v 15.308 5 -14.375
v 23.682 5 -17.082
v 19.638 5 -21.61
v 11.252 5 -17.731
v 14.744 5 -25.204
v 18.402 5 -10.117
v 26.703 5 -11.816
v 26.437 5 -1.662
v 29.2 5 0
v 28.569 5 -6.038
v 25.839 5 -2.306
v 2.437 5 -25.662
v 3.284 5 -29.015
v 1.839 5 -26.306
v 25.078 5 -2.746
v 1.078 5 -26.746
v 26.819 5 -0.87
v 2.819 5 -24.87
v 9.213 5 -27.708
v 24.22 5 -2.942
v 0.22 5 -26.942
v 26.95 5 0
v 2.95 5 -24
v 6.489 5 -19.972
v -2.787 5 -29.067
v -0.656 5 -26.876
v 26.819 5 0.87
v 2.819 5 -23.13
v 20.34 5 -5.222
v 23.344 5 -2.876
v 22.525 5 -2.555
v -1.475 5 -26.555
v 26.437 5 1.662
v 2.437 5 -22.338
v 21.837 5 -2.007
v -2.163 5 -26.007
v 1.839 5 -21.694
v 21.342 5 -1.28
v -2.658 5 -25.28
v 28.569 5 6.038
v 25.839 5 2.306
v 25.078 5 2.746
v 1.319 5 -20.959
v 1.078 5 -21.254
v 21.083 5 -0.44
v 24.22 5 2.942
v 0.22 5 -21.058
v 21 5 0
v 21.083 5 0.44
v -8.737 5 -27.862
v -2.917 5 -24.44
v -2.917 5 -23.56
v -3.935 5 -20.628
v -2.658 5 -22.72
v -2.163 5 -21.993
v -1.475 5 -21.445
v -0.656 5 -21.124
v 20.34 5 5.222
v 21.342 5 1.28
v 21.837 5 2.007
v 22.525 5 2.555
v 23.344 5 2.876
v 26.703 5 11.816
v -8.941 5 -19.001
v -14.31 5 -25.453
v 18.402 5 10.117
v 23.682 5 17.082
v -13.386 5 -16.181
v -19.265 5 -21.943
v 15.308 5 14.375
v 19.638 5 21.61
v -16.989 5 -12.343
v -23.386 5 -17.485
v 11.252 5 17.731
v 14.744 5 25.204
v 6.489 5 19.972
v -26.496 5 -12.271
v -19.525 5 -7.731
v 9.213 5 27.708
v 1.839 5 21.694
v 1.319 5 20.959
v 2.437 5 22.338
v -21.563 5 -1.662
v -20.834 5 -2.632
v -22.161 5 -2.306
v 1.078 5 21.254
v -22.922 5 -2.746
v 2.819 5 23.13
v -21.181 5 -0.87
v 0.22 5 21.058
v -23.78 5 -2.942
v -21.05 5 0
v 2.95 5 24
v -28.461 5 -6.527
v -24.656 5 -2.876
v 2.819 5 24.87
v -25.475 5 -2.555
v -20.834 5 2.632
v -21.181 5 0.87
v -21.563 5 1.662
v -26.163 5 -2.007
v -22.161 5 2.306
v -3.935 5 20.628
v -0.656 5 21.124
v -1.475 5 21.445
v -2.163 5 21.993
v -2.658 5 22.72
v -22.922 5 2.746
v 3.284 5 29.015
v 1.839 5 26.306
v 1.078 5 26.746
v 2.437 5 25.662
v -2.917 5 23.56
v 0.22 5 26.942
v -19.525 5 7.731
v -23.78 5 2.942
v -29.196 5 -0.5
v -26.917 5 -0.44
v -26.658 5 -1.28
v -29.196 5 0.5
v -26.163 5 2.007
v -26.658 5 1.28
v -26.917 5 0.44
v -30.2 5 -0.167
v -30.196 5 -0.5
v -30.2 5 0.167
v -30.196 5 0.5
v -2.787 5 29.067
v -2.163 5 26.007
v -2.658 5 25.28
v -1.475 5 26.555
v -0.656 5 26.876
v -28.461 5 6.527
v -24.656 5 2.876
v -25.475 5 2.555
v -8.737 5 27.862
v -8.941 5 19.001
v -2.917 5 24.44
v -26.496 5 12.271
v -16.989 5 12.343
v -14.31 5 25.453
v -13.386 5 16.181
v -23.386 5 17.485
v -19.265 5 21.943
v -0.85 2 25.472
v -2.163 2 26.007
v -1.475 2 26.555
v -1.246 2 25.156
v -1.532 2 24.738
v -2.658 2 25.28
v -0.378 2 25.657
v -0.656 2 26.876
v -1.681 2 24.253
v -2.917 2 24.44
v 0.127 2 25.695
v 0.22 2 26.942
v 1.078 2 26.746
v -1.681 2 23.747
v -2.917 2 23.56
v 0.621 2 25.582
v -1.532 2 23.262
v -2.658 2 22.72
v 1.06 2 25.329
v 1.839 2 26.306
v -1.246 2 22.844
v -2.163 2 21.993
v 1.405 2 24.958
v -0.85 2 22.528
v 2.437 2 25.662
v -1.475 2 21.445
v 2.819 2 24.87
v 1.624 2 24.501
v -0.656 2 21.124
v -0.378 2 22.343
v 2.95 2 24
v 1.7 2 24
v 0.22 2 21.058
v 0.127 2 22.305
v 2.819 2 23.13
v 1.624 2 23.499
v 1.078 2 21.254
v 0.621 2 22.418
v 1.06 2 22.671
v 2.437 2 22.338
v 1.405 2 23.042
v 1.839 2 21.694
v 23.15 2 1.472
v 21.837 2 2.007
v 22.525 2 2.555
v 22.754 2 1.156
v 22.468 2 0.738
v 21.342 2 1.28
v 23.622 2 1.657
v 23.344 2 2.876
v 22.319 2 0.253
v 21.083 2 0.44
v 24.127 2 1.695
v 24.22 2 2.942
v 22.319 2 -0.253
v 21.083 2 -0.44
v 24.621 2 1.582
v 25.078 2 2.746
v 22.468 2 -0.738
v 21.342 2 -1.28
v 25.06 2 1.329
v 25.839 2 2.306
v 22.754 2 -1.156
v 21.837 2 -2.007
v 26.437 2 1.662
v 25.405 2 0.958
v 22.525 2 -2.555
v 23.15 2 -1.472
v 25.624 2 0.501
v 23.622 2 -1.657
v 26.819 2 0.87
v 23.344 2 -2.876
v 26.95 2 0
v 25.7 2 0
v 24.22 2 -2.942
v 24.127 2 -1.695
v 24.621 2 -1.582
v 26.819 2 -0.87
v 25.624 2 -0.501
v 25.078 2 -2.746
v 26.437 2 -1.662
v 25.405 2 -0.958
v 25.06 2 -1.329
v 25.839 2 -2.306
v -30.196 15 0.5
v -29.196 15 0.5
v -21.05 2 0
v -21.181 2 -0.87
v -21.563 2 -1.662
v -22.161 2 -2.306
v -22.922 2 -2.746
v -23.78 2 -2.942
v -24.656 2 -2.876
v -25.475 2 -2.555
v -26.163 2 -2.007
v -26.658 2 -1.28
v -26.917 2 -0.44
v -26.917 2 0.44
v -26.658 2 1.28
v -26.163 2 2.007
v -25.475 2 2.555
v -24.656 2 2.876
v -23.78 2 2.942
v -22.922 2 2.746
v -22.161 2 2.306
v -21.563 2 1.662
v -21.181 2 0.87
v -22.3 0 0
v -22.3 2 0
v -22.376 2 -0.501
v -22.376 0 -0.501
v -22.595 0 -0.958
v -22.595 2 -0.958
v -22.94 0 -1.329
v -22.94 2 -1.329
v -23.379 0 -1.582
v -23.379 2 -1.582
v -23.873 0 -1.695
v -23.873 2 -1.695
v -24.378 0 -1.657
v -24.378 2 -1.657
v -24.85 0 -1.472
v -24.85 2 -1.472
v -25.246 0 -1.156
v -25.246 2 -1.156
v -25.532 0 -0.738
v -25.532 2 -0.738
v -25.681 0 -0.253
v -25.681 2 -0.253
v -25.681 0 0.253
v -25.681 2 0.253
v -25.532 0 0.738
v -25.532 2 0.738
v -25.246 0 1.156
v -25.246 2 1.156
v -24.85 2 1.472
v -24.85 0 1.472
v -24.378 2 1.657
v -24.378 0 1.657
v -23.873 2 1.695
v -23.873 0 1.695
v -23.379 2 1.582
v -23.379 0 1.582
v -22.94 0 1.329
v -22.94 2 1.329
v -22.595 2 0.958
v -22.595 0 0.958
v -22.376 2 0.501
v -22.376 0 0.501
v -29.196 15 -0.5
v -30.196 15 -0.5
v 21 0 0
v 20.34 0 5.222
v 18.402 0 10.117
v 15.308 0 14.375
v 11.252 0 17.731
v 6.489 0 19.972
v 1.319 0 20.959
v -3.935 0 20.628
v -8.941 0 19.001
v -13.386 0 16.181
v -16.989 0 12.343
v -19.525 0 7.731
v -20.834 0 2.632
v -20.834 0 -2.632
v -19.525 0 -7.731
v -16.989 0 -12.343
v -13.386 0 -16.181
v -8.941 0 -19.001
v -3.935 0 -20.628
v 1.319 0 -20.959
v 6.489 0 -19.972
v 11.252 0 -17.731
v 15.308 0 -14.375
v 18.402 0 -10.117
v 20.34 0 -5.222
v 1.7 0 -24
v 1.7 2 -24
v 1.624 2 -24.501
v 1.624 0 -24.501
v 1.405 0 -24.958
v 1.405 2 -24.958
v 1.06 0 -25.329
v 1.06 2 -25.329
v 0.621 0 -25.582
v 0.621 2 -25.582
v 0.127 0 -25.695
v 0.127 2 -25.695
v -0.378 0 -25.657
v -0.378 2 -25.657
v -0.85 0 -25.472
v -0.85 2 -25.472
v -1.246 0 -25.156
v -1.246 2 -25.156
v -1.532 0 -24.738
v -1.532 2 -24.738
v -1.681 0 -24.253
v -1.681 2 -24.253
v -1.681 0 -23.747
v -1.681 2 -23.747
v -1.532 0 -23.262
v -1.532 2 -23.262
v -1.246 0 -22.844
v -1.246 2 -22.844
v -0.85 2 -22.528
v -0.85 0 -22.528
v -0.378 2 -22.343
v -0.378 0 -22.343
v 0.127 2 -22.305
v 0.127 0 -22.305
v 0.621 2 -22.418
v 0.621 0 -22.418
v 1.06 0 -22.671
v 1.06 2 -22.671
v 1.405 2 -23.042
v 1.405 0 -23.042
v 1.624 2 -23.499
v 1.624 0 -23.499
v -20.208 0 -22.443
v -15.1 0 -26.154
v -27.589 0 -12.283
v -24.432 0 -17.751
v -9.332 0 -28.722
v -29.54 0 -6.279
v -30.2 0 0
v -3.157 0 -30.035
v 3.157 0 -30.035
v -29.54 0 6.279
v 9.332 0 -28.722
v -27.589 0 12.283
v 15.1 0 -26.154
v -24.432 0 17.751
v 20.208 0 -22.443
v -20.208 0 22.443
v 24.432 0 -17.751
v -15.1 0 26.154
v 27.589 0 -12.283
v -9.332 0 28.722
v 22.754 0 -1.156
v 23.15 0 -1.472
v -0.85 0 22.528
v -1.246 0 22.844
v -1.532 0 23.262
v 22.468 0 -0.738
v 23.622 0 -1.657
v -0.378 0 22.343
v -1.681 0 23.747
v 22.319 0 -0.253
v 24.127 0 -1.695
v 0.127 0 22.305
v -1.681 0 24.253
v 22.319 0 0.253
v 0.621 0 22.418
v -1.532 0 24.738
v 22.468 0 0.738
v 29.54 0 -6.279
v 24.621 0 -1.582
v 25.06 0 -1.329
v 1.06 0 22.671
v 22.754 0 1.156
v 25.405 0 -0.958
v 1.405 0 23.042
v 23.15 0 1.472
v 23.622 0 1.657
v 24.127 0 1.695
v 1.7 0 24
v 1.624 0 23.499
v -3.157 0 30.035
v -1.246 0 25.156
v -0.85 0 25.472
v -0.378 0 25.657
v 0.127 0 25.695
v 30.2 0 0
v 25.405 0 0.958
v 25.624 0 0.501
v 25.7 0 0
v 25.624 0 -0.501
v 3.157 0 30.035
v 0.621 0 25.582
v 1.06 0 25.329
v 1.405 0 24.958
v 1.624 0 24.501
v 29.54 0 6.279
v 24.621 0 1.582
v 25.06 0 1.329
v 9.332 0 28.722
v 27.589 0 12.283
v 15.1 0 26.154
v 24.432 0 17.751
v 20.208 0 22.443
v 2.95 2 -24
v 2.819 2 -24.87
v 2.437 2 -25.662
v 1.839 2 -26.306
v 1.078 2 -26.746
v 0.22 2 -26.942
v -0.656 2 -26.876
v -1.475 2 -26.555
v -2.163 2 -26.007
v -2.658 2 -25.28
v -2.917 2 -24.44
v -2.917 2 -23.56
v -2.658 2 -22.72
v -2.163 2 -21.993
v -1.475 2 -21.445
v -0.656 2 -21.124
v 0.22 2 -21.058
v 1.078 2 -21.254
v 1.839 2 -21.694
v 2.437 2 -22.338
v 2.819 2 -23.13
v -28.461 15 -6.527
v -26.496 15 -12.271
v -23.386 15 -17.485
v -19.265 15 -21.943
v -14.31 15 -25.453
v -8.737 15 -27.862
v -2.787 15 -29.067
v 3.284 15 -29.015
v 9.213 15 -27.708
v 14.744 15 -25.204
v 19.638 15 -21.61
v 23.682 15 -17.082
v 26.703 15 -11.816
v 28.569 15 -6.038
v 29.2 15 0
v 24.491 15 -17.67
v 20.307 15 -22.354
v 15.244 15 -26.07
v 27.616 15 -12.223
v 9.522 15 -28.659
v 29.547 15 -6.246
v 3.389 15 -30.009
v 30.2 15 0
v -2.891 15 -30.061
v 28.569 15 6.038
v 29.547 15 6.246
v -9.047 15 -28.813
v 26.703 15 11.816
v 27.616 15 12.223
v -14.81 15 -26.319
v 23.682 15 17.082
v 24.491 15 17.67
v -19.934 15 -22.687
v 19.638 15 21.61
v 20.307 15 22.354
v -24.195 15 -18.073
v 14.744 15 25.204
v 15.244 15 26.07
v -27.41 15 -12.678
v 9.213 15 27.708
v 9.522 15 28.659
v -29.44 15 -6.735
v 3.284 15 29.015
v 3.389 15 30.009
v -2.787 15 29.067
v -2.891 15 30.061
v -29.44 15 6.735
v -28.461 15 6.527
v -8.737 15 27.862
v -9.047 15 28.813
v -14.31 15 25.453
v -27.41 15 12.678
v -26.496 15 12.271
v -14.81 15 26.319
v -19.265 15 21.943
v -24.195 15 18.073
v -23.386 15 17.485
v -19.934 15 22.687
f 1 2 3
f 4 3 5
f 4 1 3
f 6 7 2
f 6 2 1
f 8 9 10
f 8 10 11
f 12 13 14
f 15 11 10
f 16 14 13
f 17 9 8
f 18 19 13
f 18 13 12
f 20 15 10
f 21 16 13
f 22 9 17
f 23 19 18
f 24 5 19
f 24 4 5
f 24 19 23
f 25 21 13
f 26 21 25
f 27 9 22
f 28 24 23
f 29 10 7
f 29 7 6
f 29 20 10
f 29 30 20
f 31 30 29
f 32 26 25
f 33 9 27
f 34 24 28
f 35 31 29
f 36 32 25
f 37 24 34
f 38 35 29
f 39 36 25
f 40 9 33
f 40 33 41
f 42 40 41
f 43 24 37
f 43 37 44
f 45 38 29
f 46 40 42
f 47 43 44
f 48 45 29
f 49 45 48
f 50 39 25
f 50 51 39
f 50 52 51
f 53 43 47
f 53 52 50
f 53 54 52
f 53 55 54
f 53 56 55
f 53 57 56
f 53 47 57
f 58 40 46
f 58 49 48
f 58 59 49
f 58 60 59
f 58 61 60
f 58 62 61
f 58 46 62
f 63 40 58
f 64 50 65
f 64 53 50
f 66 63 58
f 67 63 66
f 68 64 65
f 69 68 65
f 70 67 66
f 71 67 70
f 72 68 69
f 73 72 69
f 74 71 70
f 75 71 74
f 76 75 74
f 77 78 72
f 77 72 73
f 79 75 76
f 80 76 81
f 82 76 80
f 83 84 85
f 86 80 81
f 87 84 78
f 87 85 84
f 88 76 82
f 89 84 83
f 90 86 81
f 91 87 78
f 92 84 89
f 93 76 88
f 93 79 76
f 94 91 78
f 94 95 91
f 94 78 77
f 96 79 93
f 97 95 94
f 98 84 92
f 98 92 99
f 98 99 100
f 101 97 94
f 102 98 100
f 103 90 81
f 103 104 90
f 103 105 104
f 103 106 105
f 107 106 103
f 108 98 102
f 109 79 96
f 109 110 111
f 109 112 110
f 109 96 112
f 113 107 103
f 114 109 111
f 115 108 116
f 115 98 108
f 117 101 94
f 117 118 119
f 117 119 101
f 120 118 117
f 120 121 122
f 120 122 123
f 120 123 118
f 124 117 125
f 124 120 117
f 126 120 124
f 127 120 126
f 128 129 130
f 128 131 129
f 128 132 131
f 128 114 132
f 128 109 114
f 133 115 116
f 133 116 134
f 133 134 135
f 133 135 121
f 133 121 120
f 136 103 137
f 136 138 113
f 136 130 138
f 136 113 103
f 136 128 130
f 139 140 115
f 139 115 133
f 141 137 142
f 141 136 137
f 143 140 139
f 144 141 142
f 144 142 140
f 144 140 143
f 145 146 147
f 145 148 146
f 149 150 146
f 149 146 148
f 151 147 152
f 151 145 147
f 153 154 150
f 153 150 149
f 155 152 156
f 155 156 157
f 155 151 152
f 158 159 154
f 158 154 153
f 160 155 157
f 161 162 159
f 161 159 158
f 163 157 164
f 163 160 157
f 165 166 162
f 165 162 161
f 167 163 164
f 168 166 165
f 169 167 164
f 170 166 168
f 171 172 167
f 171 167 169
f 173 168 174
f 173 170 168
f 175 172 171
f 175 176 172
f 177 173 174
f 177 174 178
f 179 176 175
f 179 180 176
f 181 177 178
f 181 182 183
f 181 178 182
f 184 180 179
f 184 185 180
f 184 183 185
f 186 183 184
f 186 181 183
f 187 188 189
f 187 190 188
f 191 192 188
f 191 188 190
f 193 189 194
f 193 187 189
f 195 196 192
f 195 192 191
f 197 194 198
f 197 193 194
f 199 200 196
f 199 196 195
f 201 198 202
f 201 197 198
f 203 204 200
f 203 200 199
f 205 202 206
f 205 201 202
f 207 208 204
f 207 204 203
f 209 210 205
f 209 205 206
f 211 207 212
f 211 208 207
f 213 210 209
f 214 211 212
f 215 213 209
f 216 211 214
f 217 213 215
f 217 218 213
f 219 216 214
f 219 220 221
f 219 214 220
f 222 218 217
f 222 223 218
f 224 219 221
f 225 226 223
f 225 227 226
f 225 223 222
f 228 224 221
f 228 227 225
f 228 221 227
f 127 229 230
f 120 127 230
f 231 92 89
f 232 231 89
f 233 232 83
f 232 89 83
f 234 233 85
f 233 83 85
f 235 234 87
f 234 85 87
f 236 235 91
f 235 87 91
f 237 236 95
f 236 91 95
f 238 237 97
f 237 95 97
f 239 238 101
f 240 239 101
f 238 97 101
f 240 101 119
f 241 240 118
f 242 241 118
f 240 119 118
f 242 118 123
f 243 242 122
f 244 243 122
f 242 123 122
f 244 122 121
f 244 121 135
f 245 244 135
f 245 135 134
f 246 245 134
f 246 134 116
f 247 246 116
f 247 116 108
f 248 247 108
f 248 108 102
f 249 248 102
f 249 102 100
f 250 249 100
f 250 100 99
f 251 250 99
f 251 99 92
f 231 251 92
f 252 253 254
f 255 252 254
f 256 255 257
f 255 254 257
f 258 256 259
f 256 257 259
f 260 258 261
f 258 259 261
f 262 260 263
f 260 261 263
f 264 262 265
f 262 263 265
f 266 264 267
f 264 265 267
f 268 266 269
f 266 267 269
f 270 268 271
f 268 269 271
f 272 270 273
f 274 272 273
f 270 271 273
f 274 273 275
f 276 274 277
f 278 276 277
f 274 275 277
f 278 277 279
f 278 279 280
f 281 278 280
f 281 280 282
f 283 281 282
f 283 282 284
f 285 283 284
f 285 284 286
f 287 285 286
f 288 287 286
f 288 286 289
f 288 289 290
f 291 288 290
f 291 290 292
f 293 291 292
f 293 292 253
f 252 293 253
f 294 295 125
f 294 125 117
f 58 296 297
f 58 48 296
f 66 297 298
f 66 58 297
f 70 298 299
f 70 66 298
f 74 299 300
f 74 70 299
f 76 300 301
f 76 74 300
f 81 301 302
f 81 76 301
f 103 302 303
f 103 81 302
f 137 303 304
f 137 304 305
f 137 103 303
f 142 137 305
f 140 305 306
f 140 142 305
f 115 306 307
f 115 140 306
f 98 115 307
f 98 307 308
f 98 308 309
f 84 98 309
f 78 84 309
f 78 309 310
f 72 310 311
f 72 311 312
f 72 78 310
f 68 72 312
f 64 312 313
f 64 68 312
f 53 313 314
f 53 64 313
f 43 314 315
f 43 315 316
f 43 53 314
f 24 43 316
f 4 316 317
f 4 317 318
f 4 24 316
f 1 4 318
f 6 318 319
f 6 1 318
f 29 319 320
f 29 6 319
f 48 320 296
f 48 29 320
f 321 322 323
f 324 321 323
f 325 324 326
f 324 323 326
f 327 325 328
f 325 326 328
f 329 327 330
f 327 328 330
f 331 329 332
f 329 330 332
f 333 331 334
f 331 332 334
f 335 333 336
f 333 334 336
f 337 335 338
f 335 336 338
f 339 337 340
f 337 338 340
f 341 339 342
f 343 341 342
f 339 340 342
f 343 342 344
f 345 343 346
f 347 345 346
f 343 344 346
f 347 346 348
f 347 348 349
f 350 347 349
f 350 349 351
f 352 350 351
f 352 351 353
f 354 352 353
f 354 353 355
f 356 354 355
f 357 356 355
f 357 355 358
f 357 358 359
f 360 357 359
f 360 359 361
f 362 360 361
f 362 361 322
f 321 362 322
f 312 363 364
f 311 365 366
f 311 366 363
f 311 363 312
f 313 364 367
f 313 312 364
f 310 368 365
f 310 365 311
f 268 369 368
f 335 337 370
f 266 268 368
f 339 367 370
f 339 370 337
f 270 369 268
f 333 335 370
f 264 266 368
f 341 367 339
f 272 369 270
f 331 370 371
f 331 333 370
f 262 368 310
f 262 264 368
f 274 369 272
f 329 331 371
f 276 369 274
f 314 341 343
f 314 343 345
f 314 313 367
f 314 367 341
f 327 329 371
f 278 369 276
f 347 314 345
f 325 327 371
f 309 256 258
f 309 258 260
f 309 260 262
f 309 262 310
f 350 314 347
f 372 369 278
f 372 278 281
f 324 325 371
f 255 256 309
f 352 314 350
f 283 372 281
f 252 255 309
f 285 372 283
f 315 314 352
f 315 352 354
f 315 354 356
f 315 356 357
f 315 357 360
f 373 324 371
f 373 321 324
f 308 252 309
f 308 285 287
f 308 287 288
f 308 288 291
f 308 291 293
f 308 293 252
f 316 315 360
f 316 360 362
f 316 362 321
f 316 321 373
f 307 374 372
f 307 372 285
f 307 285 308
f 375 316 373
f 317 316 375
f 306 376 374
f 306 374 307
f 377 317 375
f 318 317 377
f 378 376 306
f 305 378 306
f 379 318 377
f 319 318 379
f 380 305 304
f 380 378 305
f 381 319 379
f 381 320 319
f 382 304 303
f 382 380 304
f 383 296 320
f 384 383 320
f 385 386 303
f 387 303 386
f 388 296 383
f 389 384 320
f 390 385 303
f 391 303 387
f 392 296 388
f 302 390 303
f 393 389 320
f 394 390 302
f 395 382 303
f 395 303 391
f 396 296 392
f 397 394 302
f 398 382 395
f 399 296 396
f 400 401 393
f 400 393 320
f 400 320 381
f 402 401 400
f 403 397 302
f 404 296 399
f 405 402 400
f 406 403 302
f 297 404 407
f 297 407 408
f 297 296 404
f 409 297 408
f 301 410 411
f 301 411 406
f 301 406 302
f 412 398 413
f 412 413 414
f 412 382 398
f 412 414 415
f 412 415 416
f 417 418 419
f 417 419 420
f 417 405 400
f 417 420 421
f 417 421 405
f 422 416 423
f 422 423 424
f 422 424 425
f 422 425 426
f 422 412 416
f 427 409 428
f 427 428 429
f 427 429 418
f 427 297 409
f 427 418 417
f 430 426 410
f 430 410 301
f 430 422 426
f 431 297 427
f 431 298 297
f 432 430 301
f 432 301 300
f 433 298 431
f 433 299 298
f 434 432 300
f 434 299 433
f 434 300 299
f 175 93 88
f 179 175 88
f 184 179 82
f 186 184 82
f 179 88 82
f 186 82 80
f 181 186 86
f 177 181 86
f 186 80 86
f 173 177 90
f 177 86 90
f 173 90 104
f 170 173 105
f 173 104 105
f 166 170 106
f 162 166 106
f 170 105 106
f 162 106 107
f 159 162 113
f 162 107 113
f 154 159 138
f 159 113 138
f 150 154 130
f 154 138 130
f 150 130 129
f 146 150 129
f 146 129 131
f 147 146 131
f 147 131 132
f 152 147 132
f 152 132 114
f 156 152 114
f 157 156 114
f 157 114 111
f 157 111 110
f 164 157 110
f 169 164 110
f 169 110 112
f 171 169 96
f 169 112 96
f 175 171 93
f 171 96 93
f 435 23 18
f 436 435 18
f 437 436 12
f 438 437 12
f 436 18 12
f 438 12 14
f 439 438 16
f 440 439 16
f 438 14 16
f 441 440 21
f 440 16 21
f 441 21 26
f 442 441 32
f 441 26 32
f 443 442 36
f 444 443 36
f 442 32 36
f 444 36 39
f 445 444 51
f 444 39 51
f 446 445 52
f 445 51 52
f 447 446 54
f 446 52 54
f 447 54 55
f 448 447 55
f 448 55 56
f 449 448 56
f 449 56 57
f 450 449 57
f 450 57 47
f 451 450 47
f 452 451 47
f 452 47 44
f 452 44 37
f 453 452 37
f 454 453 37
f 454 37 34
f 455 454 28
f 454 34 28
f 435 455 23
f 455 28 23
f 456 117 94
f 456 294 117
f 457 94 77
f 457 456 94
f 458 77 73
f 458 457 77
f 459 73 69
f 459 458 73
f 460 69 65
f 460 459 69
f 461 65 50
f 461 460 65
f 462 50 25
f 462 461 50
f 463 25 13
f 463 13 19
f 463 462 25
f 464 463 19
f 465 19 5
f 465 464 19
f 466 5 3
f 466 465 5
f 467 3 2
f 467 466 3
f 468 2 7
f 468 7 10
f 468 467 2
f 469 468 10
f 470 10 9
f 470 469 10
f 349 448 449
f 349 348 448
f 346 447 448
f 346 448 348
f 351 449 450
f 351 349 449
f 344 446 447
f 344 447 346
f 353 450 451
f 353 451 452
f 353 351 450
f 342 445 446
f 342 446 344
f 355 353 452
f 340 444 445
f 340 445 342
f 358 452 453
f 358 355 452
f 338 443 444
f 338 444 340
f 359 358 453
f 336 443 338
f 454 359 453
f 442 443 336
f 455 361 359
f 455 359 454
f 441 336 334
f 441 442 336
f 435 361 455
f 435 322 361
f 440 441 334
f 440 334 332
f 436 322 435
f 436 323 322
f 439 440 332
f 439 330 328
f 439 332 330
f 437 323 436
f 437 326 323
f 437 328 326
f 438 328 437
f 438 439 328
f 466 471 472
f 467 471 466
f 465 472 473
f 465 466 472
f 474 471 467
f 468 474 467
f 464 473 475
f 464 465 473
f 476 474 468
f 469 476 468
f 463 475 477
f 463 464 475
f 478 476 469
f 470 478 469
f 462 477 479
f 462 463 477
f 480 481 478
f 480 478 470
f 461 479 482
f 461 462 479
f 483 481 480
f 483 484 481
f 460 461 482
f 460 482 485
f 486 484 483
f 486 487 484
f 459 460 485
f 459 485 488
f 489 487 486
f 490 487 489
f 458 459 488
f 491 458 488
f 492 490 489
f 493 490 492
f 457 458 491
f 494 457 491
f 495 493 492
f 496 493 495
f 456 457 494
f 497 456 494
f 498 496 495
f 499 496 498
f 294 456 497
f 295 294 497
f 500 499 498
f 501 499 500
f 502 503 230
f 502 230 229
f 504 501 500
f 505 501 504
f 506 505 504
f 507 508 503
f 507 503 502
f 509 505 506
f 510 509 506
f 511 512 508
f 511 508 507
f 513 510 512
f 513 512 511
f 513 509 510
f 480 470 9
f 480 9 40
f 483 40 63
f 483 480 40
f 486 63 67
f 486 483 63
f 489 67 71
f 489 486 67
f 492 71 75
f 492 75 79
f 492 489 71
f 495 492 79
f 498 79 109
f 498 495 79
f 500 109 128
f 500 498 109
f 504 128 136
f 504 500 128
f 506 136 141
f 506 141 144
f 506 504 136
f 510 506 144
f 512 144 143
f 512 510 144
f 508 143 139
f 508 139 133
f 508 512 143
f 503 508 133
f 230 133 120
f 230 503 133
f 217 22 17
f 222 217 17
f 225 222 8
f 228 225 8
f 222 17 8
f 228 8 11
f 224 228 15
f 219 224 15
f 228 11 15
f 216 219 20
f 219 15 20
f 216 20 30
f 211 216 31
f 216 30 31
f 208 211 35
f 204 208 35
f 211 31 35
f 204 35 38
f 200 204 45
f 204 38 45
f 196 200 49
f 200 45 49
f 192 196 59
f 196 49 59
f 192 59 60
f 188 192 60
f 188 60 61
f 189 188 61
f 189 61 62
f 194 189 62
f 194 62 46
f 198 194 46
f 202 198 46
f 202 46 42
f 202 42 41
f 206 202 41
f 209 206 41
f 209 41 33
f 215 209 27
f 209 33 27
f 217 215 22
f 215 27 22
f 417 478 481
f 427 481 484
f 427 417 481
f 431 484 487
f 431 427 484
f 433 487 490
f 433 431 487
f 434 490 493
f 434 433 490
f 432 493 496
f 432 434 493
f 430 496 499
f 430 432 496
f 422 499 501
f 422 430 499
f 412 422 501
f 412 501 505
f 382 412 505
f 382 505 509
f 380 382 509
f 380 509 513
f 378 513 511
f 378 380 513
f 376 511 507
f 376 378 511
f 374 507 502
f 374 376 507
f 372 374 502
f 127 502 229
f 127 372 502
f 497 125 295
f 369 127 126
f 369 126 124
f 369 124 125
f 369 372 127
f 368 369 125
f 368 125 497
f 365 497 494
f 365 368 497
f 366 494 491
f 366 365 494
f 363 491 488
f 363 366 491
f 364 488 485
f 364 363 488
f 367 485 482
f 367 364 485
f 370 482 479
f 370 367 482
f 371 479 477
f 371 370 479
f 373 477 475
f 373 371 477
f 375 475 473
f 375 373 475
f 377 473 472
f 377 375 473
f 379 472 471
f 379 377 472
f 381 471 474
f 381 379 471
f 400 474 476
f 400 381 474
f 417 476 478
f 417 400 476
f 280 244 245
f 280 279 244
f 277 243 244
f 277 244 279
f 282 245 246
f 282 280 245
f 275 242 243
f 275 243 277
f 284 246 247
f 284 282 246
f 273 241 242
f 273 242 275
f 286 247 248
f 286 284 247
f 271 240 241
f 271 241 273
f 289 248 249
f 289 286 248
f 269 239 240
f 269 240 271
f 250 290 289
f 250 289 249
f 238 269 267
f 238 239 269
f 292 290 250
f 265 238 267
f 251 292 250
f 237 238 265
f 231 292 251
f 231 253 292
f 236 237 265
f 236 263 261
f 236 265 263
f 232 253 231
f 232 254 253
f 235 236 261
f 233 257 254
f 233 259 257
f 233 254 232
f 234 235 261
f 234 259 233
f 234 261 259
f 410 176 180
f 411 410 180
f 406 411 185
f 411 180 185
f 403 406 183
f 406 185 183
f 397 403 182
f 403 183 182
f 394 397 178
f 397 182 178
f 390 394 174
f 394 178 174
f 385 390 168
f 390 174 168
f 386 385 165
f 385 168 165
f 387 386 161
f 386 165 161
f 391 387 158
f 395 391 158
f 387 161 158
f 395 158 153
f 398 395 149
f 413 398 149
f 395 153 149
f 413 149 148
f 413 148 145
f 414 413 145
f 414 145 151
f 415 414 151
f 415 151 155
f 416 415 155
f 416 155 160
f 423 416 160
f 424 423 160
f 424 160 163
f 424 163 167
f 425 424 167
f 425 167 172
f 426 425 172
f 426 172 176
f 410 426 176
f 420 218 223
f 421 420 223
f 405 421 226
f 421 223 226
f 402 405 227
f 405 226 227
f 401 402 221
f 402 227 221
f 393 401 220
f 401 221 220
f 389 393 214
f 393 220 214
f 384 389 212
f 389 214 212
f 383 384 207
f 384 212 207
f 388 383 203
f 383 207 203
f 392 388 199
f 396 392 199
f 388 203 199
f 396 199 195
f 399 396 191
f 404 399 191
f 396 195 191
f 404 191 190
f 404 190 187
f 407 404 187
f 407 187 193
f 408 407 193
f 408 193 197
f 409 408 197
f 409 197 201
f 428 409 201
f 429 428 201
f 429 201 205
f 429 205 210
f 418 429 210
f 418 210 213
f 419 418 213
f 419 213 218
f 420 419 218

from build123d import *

# Parameters (mm, degrees)
CROQUIS2_R            = 1.7
CORTAR_EXTRUIR1_DEPTH = 10
CROQUIS3_R            = 2.95
CORTAR_EXTRUIR2_DEPTH = 3
CROQUIS4_W            = 10
CROQUIS4_H            = 1
CORTAR_EXTRUIR3_DEPTH = 10


with BuildPart() as part:
    # Croquis1 → Revolución1 (revolve)
    with BuildSketch(Plane.XY):
        Polygon((21, 0), (21, 5), (29.2, 5), (29.2, 15), (30.2, 15), (30.2, 0), align=None)
    revolve(axis=Axis((0, 26.816952267, 0), (0, -1, 0)))

    # Croquis2 → Cortar-Extruir1 (cut)
    with BuildSketch(Plane(origin=(0, 5, 0), x_dir=(1, 0, 0), z_dir=(0, 1, 0))):
        with Locations((-24, 0)):
            Circle(CROQUIS2_R)
        with Locations((0, 24)):
            Circle(CROQUIS2_R)
        with Locations((24, 0)):
            Circle(CROQUIS2_R)
        with Locations((0, -24)):
            Circle(CROQUIS2_R)
    extrude(amount=-CORTAR_EXTRUIR1_DEPTH, mode=Mode.SUBTRACT)

    # Croquis3 → Cortar-Extruir2 (cut)
    with BuildSketch(Plane(origin=(0, 5, 0), x_dir=(1, 0, 0), z_dir=(0, 1, 0))):
        with Locations((-24, 0)):
            Circle(CROQUIS3_R)
        with Locations((0, 24)):
            Circle(CROQUIS3_R)
        with Locations((24, 0)):
            Circle(CROQUIS3_R)
        with Locations((0, -24)):
            Circle(CROQUIS3_R)
    extrude(amount=-CORTAR_EXTRUIR2_DEPTH, mode=Mode.SUBTRACT)

    # Croquis4 → Cortar-Extruir3 (cut)
    with BuildSketch(Plane(origin=(0, 15, 0), x_dir=(1, 0, 0), z_dir=(0, 1, 0))):
        with Locations((-29.2, 0)):
            Rectangle(CROQUIS4_W, CROQUIS4_H)
    extrude(amount=-CORTAR_EXTRUIR3_DEPTH, mode=Mode.SUBTRACT)


solid = part.part
